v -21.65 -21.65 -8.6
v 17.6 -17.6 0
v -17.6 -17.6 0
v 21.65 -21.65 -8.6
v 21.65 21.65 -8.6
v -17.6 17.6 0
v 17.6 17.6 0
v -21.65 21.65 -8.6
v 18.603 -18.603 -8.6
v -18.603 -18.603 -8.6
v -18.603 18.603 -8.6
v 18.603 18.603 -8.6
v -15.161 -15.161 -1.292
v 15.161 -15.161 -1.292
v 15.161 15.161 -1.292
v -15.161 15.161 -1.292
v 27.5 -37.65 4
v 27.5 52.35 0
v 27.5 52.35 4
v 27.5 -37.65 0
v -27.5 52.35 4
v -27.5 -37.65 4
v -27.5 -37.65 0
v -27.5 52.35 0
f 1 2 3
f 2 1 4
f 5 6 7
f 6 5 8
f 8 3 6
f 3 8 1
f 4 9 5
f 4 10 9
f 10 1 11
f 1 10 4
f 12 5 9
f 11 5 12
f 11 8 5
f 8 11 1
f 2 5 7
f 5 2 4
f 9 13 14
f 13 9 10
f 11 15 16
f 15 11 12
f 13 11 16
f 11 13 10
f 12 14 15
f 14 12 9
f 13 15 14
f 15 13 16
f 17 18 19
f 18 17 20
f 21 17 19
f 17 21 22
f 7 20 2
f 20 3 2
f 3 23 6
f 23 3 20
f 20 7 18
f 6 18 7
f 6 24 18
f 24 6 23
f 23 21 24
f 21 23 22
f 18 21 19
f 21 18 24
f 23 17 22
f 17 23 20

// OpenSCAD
/**
 * Calculate the hypotenuse of a right triangle given its two cathetus.
 */
function hypotenuse(cathetus1, cathetus2) =
    sqrt(pow(cathetus1, 2) + pow(cathetus2, 2));

/**
 * Creates a square truncated pyramid given its base and top sides and height.
 */
module truncated_pyramid(base_side, top_side, height) {
    rotate(a=45) cylinder(
        h=height,
        r1=(hypotenuse(base_side, base_side) / 2),
        r2=(hypotenuse(top_side, top_side) / 2),
        $fn=4
    );
}

/**
 * Creates the piece that hooks into the tripod quick release bay.
 * This is for Dolica ST-500 or compatible tripods.
 */
module tripod_base(base_side, top_side, height, wall) {
    scaling = (base_side - wall * 2) / base_side;
    union() {
        difference() {
            truncated_pyramid(base_side, top_side, height);
            translate([0, 0, -0.1]) scale(scaling) {
                truncated_pyramid(base_side, top_side, height);
            }
        }
        translate([0, 0, height]) {
            cube([top_side, top_side, 1], center=true);
        }
    }
}

/**
 * Creates the piece that supports the battery.
 */
module battery_support(width, length, height) {
    translate([width / -2, length / -2, 0]) {
        cube([width, length, height]);
    }
}

/**
 * Creates the final piece with the tripod quick release plate and the battery
 * support.
 */
module tripod_lithium_battery_support(
        base_bottom, base_top, base_height, base_wall,
        support_width, support_length, support_height,
        base_distance_from_edge) {
    support_translate = (
        (support_length / 2) - (base_distance_from_edge + (base_bottom / 2))
    );

    union() {
        translate([0, 0, -base_height]) {
            tripod_base(base_bottom, base_top, base_height, base_wall);
        }
        translate([0, support_translate, 0]) {
            battery_support(support_width, support_length, support_height);
        }
    }
}


/**
 * This are the main dimensions of the tripod support for a large lithium
 * battery. See README.rst for details.
 */
base_bottom = 43.30;
base_top = 35.20;
base_height = 8.6;
base_wall = 3;

support_width = 55;
support_length = 90;
support_height = 4;

base_distance_from_edge = 16;

tripod_lithium_battery_support(
    base_bottom, base_top, base_height, base_wall,
    support_width, support_length, support_height,
    base_distance_from_edge
);
